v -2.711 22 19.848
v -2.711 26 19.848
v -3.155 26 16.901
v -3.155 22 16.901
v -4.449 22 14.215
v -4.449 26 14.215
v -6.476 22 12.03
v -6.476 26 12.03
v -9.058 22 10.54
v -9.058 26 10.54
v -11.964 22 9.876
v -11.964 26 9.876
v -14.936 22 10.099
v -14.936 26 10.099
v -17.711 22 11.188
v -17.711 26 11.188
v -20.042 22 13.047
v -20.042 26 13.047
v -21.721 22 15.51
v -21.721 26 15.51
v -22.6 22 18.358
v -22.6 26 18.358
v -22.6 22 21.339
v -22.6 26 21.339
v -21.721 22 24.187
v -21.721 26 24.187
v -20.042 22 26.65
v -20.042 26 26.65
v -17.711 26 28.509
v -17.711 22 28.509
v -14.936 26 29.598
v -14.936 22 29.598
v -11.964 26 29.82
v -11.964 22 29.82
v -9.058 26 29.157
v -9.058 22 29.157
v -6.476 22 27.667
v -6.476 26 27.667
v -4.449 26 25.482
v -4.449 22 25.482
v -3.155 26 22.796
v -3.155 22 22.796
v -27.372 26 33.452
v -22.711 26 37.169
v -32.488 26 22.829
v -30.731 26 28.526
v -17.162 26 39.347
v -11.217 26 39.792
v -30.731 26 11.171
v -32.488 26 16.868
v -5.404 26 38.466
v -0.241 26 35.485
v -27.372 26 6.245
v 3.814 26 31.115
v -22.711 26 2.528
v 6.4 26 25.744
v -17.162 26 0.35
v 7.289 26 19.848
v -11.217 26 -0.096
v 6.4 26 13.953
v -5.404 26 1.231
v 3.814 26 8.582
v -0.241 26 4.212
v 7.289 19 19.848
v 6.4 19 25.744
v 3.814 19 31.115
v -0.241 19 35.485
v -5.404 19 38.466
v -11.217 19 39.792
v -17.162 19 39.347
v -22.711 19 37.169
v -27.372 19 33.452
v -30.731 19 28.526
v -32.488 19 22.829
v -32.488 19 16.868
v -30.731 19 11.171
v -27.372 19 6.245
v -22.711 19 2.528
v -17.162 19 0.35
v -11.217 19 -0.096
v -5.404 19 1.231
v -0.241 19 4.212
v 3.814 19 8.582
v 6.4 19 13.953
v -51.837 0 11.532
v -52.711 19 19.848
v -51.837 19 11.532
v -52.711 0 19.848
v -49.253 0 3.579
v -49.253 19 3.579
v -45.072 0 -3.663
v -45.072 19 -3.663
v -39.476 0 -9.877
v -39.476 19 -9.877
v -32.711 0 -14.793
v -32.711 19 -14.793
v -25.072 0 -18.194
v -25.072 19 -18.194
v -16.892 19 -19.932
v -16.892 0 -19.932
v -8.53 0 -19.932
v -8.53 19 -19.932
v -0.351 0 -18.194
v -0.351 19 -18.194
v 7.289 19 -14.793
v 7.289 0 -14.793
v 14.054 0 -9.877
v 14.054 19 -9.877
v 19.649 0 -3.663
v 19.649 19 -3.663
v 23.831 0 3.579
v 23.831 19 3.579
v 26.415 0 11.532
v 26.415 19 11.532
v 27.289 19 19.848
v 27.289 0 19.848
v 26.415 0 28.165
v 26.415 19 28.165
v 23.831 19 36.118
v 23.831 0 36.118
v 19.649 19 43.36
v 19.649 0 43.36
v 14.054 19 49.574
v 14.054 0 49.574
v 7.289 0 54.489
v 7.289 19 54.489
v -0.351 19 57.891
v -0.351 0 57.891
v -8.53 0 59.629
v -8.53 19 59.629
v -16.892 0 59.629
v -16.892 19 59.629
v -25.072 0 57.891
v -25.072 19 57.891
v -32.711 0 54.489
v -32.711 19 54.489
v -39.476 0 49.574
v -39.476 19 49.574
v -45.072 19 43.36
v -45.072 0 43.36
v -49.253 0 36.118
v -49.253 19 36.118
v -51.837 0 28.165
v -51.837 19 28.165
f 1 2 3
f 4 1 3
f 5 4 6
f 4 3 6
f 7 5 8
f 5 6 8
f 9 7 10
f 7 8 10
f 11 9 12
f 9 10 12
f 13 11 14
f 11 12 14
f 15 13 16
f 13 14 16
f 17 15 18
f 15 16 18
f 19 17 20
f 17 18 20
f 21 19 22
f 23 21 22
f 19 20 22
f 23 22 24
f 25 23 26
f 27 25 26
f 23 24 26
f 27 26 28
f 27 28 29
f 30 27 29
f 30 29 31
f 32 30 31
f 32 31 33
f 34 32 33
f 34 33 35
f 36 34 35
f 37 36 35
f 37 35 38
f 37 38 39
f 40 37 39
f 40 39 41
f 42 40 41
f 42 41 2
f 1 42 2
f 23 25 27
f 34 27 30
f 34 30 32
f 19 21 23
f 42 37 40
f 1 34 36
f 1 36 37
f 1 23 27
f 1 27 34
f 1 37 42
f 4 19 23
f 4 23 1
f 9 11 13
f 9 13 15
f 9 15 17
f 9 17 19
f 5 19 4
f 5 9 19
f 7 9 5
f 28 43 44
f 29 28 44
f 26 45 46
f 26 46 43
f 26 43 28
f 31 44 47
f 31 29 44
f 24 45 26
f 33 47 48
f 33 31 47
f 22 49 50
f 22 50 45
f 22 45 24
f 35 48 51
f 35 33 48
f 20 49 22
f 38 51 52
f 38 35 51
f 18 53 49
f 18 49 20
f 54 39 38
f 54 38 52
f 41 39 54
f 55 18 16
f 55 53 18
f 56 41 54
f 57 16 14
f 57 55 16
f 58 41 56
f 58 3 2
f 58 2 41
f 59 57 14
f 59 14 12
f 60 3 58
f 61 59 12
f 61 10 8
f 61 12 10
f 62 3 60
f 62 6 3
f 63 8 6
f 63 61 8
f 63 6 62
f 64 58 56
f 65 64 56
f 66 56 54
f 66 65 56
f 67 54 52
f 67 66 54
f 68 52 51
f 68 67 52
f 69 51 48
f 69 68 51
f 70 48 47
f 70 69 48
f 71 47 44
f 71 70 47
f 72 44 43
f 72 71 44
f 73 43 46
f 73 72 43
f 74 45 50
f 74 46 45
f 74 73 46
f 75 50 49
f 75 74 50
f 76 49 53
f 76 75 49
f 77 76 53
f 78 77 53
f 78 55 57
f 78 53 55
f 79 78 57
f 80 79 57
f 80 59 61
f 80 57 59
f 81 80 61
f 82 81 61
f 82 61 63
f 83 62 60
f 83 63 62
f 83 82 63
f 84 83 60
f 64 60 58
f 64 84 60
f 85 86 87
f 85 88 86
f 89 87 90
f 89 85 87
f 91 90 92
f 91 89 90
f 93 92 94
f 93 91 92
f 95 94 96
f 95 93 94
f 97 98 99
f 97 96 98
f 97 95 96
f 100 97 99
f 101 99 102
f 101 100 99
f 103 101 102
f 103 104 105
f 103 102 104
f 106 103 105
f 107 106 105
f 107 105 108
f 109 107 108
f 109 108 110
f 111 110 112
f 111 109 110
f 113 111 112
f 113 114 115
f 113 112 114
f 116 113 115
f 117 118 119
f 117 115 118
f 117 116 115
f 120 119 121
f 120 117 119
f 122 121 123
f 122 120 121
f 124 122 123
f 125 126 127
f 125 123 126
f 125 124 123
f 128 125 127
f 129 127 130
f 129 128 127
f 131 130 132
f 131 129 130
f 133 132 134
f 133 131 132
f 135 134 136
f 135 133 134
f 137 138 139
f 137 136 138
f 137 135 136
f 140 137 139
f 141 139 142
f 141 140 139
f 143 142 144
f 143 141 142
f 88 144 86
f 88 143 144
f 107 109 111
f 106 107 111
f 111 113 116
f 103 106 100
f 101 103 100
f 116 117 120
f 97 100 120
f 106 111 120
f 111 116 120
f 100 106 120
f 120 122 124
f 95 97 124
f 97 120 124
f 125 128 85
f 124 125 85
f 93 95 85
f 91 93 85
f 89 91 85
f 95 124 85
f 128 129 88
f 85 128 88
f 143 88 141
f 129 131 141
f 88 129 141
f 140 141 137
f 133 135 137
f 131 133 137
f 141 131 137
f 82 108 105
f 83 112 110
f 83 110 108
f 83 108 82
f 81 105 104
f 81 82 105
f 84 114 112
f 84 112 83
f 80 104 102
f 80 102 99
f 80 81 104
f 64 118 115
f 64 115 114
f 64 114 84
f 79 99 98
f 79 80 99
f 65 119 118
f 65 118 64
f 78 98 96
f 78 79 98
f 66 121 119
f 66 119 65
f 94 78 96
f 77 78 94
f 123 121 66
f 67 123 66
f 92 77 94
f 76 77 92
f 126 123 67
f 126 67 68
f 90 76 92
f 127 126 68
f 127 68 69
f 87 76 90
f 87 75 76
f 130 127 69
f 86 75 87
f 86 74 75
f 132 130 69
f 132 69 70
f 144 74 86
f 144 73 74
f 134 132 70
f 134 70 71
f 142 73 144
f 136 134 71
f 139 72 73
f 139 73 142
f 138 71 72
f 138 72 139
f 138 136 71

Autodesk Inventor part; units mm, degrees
ref_plane "YZ Plane" through (0, 0, 0) normal (1, 0, 0) x (0, 1, 0)
ref_plane "XZ Plane" through (0, 0, 0) normal (0, 1, 0) x (-1, 0, 0)
ref_plane "XY Plane" through (0, 0, 0) normal (0, 0, 1) x (1, 0, 0)
sketch "Sketch1" plane through (0, 0, 0) normal (0, 1, 0) x (-1, 0, 0)
  circle A0 centre (12.7112, 19.8484) radius 40
  point P0 (0, 0)
extrude "Extrusion1" add sketch "Sketch1" along normal blind 19
sketch "Sketch2" plane through (-12.7112, 19, 19.8484) normal (0, 1, 0) x (1, 0, 0)
  point P0 (12.7112, 19.8484)
sketch "Sketch3" plane through (-12.7112, 19, 19.8484) normal (0, 1, 0) x (1, 0, 0)
  circle A0 centre (0, 0) radius 20
  point P0 (12.7112, 19.8484)
  dimension "d3" = 40
extrude "Extrusion2" add sketch "Sketch3" along normal blind 7
sketch "Sketch4" plane through (-12.7112, 26, 19.8484) normal (0, 1, 0) x (1, 0, 0)
  circle A0 centre (0, 0) radius 10
  point P0 (12.7112, 19.8484)
  dimension "d6" = 20
extrude "Extrusion3" cut sketch "Sketch4" against normal blind 4
